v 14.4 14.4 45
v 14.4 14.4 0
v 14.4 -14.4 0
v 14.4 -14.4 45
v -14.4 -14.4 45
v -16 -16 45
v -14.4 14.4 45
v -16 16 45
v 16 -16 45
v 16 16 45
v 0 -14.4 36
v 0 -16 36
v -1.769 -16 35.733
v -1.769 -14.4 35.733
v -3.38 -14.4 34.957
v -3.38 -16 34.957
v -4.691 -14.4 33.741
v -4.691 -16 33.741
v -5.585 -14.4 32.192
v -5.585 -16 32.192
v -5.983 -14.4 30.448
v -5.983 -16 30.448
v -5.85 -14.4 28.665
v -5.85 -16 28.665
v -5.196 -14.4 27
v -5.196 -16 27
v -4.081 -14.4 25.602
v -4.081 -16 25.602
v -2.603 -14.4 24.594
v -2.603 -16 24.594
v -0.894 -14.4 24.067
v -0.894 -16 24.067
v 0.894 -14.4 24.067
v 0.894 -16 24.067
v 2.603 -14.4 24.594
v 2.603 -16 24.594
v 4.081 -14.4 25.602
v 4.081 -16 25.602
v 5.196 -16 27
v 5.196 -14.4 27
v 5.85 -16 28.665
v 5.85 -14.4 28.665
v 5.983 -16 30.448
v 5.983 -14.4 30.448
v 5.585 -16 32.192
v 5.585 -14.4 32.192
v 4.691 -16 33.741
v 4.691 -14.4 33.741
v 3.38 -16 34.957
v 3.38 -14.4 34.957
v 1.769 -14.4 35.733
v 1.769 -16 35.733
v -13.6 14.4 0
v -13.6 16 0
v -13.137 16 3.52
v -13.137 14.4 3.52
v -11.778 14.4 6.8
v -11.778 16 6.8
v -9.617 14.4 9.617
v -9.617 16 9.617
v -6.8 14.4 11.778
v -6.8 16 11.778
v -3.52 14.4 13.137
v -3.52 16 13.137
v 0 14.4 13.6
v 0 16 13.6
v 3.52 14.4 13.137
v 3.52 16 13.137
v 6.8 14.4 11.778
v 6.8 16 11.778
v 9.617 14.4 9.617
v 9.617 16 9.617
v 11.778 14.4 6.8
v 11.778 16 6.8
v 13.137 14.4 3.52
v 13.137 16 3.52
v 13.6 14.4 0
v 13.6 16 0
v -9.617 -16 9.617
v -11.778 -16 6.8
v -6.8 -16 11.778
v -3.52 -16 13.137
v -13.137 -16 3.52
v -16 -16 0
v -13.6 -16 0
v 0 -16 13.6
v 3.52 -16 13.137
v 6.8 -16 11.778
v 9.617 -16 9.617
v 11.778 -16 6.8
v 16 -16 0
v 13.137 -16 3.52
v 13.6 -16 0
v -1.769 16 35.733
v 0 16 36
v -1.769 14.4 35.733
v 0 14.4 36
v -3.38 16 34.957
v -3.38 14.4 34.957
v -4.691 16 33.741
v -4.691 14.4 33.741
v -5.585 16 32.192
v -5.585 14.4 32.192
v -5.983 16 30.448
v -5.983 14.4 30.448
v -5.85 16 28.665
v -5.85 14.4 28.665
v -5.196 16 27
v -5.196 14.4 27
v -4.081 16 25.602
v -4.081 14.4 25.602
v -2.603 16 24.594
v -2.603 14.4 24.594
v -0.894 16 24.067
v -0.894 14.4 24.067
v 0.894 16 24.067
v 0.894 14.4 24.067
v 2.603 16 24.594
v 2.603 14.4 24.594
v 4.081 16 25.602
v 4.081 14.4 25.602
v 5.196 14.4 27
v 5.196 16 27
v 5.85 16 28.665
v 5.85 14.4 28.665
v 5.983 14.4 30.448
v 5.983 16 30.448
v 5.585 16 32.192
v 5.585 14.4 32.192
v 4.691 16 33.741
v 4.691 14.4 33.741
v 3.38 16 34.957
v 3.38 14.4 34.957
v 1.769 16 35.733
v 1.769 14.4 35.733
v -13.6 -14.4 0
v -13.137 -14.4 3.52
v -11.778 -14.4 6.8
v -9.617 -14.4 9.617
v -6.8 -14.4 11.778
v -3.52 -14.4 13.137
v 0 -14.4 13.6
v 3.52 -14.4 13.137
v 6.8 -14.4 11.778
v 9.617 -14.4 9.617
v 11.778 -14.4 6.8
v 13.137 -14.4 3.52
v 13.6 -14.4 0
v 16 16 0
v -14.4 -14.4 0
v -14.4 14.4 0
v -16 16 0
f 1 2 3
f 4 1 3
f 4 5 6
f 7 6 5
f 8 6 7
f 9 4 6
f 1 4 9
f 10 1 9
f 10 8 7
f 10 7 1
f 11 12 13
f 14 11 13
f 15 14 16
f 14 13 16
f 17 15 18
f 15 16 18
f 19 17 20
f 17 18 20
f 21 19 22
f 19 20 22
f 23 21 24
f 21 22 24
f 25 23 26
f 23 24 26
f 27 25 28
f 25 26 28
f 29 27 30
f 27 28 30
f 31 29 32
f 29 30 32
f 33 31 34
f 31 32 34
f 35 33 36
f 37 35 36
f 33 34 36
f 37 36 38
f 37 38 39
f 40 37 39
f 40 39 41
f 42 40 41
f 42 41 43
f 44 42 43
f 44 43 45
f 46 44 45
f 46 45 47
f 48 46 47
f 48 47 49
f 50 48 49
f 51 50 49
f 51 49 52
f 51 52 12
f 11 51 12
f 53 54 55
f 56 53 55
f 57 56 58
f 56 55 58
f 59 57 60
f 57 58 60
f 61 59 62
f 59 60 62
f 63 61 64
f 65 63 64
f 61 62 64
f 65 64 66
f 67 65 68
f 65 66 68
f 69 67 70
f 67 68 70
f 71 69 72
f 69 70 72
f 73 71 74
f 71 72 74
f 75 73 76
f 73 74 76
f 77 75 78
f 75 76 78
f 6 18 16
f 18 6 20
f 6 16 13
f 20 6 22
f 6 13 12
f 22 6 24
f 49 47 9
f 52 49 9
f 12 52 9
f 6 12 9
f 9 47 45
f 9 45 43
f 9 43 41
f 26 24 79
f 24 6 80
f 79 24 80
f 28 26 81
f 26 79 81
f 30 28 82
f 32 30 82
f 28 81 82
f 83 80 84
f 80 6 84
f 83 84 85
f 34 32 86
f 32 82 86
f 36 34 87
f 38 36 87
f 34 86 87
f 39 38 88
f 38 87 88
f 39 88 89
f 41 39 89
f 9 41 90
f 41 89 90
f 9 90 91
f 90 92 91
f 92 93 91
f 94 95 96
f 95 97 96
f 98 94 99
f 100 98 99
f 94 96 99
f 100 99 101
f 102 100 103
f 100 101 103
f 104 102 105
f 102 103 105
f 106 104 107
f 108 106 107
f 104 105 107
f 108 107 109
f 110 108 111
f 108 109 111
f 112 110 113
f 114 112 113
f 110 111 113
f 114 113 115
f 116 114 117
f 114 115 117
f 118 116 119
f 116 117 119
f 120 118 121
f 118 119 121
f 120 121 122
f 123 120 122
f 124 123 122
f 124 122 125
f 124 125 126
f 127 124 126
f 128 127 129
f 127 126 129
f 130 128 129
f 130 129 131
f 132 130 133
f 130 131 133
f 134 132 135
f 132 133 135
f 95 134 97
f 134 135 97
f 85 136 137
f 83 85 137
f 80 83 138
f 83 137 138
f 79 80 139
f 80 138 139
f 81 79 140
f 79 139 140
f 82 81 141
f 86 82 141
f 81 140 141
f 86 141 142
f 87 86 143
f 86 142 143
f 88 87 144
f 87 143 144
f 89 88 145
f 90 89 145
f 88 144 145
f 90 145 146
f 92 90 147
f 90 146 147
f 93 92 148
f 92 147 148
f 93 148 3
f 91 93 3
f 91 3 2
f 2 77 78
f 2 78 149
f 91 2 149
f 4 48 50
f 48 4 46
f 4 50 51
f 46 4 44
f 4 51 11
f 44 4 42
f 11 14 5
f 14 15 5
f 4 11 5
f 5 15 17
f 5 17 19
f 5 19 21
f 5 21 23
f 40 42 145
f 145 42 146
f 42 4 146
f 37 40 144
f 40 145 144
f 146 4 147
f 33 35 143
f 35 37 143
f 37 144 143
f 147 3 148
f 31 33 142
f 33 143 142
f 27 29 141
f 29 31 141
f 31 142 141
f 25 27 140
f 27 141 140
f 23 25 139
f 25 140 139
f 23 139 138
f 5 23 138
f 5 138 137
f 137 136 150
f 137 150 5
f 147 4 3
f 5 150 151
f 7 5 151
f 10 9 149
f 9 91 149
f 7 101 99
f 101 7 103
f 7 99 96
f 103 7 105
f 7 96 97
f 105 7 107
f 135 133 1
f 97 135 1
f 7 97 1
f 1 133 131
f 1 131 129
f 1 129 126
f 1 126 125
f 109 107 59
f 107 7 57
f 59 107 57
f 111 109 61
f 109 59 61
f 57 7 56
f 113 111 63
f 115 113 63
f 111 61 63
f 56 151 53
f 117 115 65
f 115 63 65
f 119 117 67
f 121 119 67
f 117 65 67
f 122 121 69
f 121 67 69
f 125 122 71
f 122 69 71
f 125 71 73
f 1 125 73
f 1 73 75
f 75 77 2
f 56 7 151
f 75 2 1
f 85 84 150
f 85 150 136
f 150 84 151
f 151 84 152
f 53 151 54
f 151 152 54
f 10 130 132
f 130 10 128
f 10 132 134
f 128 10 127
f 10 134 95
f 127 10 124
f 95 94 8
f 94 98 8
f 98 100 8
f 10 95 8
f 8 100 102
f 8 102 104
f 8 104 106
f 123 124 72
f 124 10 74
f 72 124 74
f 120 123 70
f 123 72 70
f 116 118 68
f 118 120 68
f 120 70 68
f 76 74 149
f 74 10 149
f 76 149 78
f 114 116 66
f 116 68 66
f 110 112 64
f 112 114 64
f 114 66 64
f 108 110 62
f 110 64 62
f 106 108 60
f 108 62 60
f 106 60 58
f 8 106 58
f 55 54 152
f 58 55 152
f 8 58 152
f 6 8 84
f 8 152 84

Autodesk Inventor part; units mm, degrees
ref_plane "YZ Plane" through (0, 0, 0) normal (1, 0, 0) x (0, 1, 0)
ref_plane "XZ Plane" through (0, 0, 0) normal (0, 1, 0) x (-1, 0, 0)
ref_plane "XY Plane" through (0, 0, 0) normal (0, 0, 1) x (1, 0, 0)
sketch "スケッチ1" plane through (0, 0, 0) normal (0, 0, 1) x (1, 0, 0)
  line L0 (-16, -16) -> (16, -16)
  line L1 (16, -16) -> (16, 16)
  line L2 (16, 16) -> (-16, 16)
  line L3 (-16, 16) -> (-16, -16)
  line L4 (-16, -16) -> (16, 16) construction
  line L5 (16, -16) -> (-16, 16) construction
  line L6 (-14.4, 14.4) -> (14.4, 14.4)
  line L7 (14.4, 14.4) -> (14.4, -14.4)
  line L8 (14.4, -14.4) -> (-14.4, -14.4)
  line L9 (-14.4, -14.4) -> (-14.4, 14.4)
  point P0 (0, 0)
  dimension "d0" = 32
  dimension "d1" = 32
  dimension "d2" = 1.6
extrude "押し出し1" add sketch "スケッチ1" along normal blind 45
sketch "スケッチ2" plane through (-16, 16, 0) normal (0, 1, 0) x (1, 0, 0)
  circle A0 centre (16, 0) radius 13.6
  dimension "d5" = 27.2
extrude "押し出し2" cut sketch "スケッチ2" against normal blind 32
sketch "スケッチ3" plane through (-16, 16, 45) normal (0, 1, 0) x (1, 0, 0)
  line L0 (32, 0) -> (0, 0) projected
  point P0 (16, 45)
  point P1 (16, 15)
  dimension "d16" = 30
hole "穴1" at (0, 16, 30) direction (0, -1, 0) diameter 12 end through all
sketch "スケッチ4" plane through (-16, 16, 45) normal (0, 1, 0) x (1, 0, 0)
  circle A0 centre (16, 15) radius 13.6
  point P0 (16, 45)
  dimension "d17" = 30
  dimension "d18" = 27.2
properties part number "軸受上用"
